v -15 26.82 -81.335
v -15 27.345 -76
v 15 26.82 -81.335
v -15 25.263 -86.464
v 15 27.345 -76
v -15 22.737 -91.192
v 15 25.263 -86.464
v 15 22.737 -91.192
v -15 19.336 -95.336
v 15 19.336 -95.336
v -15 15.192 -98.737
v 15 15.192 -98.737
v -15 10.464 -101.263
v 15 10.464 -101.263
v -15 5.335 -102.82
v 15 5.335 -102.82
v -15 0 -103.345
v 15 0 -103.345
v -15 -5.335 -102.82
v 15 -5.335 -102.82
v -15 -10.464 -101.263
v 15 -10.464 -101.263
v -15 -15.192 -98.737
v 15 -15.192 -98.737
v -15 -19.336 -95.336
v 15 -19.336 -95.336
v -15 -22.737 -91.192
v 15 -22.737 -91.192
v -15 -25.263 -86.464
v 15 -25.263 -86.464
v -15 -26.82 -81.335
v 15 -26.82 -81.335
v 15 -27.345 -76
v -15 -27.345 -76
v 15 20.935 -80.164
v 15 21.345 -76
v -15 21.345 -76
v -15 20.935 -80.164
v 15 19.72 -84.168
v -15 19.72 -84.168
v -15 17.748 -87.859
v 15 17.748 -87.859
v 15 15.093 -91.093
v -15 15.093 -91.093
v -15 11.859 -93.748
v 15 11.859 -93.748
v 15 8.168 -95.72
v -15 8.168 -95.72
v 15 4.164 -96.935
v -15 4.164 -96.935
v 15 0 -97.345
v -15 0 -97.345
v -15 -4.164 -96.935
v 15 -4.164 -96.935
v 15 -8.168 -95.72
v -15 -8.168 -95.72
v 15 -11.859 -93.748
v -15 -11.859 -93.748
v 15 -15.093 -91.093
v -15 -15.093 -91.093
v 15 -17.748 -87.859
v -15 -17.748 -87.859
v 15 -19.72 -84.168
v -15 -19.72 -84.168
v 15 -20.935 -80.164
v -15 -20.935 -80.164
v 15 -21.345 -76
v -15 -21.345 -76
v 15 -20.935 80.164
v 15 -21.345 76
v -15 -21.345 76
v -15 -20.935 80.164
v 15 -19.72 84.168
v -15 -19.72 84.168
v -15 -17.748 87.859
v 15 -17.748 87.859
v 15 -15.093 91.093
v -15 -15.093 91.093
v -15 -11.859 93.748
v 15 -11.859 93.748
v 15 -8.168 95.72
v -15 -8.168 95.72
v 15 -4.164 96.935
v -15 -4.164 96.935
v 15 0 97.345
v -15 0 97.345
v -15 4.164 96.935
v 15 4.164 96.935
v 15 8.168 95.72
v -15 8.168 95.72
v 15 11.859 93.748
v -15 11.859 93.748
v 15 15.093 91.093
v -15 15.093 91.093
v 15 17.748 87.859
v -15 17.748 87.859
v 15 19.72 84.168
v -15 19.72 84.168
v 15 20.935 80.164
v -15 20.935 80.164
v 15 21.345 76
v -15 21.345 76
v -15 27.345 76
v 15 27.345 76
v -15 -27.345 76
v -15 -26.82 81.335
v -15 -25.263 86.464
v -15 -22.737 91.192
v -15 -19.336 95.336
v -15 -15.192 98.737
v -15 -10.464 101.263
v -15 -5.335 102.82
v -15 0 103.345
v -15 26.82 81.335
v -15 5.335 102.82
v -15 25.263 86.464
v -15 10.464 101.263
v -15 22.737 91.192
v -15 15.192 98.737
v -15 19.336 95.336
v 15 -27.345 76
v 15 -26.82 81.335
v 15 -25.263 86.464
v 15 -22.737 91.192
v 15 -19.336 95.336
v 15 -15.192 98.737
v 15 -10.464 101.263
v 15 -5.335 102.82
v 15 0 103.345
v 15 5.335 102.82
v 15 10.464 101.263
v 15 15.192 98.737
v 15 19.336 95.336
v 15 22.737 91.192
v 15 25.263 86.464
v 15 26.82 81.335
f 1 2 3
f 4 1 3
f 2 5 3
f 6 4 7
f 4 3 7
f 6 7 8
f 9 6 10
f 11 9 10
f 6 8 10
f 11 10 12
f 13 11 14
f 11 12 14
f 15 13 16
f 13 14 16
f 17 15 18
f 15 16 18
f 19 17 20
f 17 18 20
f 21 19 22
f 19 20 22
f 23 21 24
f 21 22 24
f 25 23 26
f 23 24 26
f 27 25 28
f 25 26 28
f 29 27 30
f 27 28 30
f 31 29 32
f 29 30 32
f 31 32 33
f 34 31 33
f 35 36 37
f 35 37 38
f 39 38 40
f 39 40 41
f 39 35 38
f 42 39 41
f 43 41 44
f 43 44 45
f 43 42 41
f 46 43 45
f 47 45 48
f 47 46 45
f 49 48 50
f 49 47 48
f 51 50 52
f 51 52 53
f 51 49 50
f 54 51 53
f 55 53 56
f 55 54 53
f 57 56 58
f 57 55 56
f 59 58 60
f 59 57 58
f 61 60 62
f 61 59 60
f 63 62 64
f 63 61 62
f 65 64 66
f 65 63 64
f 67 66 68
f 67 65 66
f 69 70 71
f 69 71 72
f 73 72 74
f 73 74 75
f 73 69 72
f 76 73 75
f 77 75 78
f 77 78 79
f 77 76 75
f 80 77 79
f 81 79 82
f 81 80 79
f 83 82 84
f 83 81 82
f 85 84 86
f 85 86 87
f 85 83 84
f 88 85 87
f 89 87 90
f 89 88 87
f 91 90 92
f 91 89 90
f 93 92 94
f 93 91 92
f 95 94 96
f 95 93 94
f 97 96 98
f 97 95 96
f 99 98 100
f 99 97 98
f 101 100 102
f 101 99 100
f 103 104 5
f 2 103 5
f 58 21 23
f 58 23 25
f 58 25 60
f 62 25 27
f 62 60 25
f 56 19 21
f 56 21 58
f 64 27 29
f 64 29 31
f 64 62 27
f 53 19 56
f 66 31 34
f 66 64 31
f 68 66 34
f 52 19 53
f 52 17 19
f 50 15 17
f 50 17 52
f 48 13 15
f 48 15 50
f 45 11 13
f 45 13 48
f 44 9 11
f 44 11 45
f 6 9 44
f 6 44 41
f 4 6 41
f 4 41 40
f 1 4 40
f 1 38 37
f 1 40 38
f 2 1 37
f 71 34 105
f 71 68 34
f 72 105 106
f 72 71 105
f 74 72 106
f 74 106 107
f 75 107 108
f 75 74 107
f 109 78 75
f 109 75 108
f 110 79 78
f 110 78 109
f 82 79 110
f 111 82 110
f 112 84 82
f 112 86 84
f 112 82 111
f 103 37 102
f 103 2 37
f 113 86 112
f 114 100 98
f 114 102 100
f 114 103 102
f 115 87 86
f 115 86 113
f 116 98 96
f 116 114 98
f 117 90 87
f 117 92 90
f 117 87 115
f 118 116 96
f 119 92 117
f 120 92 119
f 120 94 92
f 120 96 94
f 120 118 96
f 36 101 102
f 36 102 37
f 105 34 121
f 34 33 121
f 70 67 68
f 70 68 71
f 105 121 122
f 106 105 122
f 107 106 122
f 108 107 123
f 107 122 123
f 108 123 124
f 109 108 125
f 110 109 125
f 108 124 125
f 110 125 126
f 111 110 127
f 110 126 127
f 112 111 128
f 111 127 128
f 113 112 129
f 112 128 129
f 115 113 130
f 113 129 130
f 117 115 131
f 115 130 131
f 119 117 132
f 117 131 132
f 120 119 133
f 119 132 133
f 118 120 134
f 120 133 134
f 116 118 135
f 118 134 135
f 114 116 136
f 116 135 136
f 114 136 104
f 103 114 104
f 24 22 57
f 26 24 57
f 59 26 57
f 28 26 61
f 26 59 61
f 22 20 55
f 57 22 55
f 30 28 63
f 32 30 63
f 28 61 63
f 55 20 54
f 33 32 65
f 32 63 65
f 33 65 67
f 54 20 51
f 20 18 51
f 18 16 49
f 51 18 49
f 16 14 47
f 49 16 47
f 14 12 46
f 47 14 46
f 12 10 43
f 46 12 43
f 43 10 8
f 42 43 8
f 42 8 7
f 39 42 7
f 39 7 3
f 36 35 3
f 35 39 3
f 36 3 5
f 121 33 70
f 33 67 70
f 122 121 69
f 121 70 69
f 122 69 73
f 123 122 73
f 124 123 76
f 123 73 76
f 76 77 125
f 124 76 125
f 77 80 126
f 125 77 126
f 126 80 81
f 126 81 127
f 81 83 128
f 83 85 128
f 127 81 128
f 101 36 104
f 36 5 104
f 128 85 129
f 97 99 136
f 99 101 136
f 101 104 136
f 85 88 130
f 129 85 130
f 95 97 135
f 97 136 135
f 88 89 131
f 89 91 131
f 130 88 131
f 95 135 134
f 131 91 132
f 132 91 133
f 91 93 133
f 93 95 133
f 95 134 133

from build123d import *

# Parameters (mm, degrees)
EXTRUDE_1_DEPTH      = 15
EXTRUDE_1_DEPTH_BACK = 15
CUT_EXTRUDE_1_DEPTH  = 30


with BuildPart() as part:
    # 스케치2 → 보스-돌출1 (new, two sides: drawn at the far end of the back side and taken through both)
    with BuildSketch(Plane(origin=(0, 0, 0), x_dir=(0, 0, -1), z_dir=(1, 0, 0)).offset(-EXTRUDE_1_DEPTH_BACK)):
        with BuildLine():
            Line((-76, 27.345), (76, 27.345))
            ThreePointArc((76, 27.345), (103.345, 0), (76, -27.345))
            Line((76, -27.345), (-76, -27.345))
            ThreePointArc((-76, -27.345), (-103.345, 0), (-76, 27.345))
        make_face()
    extrude(amount=EXTRUDE_1_DEPTH + EXTRUDE_1_DEPTH_BACK)

    # 스케치3 → 컷-돌출1 (cut)
    with BuildSketch(Plane(origin=(15, 0, 0), x_dir=(0, 0, -1), z_dir=(1, 0, 0))):
        with BuildLine():
            Line((-76, 21.345), (76, 21.345))
            ThreePointArc((76, 21.345), (97.345, 0), (76, -21.345))
            Line((76, -21.345), (-76, -21.345))
            ThreePointArc((-76, -21.345), (-97.345, 0), (-76, 21.345))
        make_face()
    extrude(amount=-CUT_EXTRUDE_1_DEPTH, mode=Mode.SUBTRACT)


solid = part.part
